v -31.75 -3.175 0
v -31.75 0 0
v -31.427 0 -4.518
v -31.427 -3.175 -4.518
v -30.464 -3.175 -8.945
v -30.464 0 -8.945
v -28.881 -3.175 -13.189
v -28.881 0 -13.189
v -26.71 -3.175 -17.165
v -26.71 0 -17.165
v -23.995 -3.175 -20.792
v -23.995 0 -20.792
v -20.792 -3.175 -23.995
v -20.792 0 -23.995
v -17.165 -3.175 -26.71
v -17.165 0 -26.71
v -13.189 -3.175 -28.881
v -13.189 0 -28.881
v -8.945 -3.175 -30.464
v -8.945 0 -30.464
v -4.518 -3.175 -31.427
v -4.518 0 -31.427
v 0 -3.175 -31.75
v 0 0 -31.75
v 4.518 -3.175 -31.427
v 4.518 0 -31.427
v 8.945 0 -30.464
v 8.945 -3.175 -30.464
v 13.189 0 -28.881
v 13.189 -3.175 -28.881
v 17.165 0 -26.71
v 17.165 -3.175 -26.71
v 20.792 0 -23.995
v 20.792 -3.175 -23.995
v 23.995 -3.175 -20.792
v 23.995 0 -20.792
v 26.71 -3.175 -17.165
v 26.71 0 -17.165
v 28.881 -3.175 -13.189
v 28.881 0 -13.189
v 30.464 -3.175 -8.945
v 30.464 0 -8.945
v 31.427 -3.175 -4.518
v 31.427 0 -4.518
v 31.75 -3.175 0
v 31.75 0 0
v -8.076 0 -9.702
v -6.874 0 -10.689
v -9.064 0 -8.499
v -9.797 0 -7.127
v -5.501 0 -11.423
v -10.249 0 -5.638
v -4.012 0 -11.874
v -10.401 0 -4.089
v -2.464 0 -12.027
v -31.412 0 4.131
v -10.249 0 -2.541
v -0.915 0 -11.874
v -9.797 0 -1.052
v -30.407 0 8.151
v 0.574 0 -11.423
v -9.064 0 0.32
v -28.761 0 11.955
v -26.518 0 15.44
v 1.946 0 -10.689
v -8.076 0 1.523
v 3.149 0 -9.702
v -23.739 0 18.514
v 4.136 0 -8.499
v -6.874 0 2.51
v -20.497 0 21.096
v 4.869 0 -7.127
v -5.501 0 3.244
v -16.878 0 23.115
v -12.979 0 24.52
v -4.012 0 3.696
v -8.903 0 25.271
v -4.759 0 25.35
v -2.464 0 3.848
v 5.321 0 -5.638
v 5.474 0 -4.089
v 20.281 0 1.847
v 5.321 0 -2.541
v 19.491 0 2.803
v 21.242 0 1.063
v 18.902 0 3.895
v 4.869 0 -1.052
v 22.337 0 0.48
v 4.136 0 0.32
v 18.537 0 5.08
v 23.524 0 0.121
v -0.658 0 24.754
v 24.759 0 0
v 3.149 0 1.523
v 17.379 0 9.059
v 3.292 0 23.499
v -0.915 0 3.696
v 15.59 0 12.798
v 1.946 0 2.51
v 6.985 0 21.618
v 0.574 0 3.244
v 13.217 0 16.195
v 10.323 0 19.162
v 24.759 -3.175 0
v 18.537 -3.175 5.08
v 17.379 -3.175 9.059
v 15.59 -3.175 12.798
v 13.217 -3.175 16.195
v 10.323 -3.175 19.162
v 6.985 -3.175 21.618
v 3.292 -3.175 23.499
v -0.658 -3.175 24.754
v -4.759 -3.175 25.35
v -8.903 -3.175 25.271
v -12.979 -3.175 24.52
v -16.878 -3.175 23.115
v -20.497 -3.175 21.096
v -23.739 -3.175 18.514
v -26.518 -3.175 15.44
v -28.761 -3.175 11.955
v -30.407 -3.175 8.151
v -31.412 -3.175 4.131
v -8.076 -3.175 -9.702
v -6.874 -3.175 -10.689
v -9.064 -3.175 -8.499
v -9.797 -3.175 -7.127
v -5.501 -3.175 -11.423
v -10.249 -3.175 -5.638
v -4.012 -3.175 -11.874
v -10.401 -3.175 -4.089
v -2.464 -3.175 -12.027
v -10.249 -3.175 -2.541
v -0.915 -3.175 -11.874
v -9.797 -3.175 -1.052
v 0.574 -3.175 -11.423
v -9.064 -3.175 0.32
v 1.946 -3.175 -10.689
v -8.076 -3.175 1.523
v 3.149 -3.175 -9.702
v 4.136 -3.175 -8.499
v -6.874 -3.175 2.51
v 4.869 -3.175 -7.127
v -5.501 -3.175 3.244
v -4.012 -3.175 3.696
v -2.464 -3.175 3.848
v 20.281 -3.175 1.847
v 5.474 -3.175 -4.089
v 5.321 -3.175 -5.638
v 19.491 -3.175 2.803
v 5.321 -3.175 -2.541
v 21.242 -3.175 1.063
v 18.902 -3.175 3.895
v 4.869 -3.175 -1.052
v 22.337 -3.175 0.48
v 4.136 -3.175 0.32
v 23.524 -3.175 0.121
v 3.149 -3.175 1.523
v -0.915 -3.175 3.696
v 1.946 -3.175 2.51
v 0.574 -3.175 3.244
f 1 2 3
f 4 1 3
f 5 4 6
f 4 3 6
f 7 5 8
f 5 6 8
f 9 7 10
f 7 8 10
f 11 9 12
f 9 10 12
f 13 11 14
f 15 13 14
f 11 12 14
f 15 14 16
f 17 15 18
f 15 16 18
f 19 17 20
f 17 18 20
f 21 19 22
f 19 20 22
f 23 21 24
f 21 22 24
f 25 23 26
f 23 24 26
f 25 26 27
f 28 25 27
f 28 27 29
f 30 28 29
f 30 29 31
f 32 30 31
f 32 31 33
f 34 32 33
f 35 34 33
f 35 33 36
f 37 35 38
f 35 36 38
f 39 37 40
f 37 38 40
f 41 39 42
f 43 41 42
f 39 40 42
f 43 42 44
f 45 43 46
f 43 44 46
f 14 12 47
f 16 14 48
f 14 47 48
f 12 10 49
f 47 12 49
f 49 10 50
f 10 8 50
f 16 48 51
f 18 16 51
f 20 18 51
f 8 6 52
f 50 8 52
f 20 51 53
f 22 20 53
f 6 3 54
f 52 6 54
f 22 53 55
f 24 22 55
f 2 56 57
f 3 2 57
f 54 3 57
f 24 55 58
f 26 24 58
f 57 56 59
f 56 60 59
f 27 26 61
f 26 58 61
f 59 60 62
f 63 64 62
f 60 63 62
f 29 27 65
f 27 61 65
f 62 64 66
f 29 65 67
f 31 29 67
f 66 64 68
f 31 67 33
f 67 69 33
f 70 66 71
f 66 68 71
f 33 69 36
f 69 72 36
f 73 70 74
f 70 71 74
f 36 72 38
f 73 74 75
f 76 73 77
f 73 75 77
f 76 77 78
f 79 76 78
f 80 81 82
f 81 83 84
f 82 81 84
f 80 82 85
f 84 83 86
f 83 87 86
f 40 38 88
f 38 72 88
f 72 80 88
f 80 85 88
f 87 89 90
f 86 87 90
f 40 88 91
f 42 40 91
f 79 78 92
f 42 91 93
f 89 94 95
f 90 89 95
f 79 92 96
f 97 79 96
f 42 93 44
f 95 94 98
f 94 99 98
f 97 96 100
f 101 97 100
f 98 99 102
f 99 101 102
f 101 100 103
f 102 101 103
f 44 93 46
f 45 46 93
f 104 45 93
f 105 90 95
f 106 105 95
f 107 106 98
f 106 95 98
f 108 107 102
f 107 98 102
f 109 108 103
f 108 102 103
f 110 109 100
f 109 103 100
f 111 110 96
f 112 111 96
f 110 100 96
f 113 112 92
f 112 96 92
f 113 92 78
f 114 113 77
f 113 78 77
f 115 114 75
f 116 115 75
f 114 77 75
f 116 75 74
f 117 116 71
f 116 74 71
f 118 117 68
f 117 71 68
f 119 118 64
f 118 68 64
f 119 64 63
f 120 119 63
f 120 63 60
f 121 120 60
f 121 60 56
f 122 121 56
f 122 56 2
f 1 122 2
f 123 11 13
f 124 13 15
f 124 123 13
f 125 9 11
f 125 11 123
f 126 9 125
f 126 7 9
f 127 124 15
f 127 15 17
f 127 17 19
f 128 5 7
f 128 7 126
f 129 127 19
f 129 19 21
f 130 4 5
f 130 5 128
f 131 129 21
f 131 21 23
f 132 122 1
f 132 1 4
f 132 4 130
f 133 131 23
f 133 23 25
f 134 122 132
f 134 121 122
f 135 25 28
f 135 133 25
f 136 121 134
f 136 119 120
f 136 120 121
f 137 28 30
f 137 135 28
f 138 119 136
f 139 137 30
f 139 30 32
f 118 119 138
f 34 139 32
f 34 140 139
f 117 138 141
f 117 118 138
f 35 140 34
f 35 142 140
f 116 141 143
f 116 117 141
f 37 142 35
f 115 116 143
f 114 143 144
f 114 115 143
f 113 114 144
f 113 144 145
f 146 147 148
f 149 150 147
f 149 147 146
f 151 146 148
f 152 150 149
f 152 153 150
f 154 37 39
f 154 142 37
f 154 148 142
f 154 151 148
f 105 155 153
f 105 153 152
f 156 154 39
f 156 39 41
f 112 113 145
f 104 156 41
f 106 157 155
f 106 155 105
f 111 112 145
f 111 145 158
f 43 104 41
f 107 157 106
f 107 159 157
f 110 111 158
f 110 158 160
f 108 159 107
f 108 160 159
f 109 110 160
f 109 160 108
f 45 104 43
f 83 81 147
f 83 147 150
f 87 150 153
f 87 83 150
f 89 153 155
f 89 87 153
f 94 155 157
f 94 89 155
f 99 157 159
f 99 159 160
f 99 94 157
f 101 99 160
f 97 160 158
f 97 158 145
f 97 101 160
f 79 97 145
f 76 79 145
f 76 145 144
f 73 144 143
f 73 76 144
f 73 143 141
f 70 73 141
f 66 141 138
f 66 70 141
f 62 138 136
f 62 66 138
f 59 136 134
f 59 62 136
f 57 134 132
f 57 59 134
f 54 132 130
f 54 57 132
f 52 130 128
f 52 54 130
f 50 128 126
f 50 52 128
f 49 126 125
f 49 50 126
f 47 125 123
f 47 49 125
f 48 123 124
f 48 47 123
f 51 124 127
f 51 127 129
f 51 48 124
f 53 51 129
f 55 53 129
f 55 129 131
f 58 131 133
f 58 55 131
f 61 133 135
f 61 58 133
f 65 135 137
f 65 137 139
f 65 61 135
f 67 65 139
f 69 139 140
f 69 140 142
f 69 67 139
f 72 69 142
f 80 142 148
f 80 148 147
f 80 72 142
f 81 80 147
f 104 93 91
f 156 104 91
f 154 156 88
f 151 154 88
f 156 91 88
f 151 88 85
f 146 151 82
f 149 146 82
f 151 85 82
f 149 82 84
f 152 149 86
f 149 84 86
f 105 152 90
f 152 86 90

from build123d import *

# Parameters (mm, degrees)
F0_R     = 7.9375
F1_DEPTH = 3.175


with BuildPart() as f1:
    # F0 (on Front) → F1 (new body)
    with BuildSketch(Plane.XZ):
        with BuildLine():
            ThreePointArc((18.536816, 5.08), (-8.902928, 25.271378), (-31.75, 0))
            ThreePointArc((-31.75, 0), (0, -31.75), (31.75, 0))
            Line((31.75, 0), (24.75852, 0))
            ThreePointArc((24.75852, 0), (20.742427, 1.431311), (18.536816, 5.08))
        make_face()
        with Locations((-2.4638, -4.0894)):
            Circle(F0_R, mode=Mode.SUBTRACT)
    extrude(amount=F1_DEPTH)


solid = f1.part
